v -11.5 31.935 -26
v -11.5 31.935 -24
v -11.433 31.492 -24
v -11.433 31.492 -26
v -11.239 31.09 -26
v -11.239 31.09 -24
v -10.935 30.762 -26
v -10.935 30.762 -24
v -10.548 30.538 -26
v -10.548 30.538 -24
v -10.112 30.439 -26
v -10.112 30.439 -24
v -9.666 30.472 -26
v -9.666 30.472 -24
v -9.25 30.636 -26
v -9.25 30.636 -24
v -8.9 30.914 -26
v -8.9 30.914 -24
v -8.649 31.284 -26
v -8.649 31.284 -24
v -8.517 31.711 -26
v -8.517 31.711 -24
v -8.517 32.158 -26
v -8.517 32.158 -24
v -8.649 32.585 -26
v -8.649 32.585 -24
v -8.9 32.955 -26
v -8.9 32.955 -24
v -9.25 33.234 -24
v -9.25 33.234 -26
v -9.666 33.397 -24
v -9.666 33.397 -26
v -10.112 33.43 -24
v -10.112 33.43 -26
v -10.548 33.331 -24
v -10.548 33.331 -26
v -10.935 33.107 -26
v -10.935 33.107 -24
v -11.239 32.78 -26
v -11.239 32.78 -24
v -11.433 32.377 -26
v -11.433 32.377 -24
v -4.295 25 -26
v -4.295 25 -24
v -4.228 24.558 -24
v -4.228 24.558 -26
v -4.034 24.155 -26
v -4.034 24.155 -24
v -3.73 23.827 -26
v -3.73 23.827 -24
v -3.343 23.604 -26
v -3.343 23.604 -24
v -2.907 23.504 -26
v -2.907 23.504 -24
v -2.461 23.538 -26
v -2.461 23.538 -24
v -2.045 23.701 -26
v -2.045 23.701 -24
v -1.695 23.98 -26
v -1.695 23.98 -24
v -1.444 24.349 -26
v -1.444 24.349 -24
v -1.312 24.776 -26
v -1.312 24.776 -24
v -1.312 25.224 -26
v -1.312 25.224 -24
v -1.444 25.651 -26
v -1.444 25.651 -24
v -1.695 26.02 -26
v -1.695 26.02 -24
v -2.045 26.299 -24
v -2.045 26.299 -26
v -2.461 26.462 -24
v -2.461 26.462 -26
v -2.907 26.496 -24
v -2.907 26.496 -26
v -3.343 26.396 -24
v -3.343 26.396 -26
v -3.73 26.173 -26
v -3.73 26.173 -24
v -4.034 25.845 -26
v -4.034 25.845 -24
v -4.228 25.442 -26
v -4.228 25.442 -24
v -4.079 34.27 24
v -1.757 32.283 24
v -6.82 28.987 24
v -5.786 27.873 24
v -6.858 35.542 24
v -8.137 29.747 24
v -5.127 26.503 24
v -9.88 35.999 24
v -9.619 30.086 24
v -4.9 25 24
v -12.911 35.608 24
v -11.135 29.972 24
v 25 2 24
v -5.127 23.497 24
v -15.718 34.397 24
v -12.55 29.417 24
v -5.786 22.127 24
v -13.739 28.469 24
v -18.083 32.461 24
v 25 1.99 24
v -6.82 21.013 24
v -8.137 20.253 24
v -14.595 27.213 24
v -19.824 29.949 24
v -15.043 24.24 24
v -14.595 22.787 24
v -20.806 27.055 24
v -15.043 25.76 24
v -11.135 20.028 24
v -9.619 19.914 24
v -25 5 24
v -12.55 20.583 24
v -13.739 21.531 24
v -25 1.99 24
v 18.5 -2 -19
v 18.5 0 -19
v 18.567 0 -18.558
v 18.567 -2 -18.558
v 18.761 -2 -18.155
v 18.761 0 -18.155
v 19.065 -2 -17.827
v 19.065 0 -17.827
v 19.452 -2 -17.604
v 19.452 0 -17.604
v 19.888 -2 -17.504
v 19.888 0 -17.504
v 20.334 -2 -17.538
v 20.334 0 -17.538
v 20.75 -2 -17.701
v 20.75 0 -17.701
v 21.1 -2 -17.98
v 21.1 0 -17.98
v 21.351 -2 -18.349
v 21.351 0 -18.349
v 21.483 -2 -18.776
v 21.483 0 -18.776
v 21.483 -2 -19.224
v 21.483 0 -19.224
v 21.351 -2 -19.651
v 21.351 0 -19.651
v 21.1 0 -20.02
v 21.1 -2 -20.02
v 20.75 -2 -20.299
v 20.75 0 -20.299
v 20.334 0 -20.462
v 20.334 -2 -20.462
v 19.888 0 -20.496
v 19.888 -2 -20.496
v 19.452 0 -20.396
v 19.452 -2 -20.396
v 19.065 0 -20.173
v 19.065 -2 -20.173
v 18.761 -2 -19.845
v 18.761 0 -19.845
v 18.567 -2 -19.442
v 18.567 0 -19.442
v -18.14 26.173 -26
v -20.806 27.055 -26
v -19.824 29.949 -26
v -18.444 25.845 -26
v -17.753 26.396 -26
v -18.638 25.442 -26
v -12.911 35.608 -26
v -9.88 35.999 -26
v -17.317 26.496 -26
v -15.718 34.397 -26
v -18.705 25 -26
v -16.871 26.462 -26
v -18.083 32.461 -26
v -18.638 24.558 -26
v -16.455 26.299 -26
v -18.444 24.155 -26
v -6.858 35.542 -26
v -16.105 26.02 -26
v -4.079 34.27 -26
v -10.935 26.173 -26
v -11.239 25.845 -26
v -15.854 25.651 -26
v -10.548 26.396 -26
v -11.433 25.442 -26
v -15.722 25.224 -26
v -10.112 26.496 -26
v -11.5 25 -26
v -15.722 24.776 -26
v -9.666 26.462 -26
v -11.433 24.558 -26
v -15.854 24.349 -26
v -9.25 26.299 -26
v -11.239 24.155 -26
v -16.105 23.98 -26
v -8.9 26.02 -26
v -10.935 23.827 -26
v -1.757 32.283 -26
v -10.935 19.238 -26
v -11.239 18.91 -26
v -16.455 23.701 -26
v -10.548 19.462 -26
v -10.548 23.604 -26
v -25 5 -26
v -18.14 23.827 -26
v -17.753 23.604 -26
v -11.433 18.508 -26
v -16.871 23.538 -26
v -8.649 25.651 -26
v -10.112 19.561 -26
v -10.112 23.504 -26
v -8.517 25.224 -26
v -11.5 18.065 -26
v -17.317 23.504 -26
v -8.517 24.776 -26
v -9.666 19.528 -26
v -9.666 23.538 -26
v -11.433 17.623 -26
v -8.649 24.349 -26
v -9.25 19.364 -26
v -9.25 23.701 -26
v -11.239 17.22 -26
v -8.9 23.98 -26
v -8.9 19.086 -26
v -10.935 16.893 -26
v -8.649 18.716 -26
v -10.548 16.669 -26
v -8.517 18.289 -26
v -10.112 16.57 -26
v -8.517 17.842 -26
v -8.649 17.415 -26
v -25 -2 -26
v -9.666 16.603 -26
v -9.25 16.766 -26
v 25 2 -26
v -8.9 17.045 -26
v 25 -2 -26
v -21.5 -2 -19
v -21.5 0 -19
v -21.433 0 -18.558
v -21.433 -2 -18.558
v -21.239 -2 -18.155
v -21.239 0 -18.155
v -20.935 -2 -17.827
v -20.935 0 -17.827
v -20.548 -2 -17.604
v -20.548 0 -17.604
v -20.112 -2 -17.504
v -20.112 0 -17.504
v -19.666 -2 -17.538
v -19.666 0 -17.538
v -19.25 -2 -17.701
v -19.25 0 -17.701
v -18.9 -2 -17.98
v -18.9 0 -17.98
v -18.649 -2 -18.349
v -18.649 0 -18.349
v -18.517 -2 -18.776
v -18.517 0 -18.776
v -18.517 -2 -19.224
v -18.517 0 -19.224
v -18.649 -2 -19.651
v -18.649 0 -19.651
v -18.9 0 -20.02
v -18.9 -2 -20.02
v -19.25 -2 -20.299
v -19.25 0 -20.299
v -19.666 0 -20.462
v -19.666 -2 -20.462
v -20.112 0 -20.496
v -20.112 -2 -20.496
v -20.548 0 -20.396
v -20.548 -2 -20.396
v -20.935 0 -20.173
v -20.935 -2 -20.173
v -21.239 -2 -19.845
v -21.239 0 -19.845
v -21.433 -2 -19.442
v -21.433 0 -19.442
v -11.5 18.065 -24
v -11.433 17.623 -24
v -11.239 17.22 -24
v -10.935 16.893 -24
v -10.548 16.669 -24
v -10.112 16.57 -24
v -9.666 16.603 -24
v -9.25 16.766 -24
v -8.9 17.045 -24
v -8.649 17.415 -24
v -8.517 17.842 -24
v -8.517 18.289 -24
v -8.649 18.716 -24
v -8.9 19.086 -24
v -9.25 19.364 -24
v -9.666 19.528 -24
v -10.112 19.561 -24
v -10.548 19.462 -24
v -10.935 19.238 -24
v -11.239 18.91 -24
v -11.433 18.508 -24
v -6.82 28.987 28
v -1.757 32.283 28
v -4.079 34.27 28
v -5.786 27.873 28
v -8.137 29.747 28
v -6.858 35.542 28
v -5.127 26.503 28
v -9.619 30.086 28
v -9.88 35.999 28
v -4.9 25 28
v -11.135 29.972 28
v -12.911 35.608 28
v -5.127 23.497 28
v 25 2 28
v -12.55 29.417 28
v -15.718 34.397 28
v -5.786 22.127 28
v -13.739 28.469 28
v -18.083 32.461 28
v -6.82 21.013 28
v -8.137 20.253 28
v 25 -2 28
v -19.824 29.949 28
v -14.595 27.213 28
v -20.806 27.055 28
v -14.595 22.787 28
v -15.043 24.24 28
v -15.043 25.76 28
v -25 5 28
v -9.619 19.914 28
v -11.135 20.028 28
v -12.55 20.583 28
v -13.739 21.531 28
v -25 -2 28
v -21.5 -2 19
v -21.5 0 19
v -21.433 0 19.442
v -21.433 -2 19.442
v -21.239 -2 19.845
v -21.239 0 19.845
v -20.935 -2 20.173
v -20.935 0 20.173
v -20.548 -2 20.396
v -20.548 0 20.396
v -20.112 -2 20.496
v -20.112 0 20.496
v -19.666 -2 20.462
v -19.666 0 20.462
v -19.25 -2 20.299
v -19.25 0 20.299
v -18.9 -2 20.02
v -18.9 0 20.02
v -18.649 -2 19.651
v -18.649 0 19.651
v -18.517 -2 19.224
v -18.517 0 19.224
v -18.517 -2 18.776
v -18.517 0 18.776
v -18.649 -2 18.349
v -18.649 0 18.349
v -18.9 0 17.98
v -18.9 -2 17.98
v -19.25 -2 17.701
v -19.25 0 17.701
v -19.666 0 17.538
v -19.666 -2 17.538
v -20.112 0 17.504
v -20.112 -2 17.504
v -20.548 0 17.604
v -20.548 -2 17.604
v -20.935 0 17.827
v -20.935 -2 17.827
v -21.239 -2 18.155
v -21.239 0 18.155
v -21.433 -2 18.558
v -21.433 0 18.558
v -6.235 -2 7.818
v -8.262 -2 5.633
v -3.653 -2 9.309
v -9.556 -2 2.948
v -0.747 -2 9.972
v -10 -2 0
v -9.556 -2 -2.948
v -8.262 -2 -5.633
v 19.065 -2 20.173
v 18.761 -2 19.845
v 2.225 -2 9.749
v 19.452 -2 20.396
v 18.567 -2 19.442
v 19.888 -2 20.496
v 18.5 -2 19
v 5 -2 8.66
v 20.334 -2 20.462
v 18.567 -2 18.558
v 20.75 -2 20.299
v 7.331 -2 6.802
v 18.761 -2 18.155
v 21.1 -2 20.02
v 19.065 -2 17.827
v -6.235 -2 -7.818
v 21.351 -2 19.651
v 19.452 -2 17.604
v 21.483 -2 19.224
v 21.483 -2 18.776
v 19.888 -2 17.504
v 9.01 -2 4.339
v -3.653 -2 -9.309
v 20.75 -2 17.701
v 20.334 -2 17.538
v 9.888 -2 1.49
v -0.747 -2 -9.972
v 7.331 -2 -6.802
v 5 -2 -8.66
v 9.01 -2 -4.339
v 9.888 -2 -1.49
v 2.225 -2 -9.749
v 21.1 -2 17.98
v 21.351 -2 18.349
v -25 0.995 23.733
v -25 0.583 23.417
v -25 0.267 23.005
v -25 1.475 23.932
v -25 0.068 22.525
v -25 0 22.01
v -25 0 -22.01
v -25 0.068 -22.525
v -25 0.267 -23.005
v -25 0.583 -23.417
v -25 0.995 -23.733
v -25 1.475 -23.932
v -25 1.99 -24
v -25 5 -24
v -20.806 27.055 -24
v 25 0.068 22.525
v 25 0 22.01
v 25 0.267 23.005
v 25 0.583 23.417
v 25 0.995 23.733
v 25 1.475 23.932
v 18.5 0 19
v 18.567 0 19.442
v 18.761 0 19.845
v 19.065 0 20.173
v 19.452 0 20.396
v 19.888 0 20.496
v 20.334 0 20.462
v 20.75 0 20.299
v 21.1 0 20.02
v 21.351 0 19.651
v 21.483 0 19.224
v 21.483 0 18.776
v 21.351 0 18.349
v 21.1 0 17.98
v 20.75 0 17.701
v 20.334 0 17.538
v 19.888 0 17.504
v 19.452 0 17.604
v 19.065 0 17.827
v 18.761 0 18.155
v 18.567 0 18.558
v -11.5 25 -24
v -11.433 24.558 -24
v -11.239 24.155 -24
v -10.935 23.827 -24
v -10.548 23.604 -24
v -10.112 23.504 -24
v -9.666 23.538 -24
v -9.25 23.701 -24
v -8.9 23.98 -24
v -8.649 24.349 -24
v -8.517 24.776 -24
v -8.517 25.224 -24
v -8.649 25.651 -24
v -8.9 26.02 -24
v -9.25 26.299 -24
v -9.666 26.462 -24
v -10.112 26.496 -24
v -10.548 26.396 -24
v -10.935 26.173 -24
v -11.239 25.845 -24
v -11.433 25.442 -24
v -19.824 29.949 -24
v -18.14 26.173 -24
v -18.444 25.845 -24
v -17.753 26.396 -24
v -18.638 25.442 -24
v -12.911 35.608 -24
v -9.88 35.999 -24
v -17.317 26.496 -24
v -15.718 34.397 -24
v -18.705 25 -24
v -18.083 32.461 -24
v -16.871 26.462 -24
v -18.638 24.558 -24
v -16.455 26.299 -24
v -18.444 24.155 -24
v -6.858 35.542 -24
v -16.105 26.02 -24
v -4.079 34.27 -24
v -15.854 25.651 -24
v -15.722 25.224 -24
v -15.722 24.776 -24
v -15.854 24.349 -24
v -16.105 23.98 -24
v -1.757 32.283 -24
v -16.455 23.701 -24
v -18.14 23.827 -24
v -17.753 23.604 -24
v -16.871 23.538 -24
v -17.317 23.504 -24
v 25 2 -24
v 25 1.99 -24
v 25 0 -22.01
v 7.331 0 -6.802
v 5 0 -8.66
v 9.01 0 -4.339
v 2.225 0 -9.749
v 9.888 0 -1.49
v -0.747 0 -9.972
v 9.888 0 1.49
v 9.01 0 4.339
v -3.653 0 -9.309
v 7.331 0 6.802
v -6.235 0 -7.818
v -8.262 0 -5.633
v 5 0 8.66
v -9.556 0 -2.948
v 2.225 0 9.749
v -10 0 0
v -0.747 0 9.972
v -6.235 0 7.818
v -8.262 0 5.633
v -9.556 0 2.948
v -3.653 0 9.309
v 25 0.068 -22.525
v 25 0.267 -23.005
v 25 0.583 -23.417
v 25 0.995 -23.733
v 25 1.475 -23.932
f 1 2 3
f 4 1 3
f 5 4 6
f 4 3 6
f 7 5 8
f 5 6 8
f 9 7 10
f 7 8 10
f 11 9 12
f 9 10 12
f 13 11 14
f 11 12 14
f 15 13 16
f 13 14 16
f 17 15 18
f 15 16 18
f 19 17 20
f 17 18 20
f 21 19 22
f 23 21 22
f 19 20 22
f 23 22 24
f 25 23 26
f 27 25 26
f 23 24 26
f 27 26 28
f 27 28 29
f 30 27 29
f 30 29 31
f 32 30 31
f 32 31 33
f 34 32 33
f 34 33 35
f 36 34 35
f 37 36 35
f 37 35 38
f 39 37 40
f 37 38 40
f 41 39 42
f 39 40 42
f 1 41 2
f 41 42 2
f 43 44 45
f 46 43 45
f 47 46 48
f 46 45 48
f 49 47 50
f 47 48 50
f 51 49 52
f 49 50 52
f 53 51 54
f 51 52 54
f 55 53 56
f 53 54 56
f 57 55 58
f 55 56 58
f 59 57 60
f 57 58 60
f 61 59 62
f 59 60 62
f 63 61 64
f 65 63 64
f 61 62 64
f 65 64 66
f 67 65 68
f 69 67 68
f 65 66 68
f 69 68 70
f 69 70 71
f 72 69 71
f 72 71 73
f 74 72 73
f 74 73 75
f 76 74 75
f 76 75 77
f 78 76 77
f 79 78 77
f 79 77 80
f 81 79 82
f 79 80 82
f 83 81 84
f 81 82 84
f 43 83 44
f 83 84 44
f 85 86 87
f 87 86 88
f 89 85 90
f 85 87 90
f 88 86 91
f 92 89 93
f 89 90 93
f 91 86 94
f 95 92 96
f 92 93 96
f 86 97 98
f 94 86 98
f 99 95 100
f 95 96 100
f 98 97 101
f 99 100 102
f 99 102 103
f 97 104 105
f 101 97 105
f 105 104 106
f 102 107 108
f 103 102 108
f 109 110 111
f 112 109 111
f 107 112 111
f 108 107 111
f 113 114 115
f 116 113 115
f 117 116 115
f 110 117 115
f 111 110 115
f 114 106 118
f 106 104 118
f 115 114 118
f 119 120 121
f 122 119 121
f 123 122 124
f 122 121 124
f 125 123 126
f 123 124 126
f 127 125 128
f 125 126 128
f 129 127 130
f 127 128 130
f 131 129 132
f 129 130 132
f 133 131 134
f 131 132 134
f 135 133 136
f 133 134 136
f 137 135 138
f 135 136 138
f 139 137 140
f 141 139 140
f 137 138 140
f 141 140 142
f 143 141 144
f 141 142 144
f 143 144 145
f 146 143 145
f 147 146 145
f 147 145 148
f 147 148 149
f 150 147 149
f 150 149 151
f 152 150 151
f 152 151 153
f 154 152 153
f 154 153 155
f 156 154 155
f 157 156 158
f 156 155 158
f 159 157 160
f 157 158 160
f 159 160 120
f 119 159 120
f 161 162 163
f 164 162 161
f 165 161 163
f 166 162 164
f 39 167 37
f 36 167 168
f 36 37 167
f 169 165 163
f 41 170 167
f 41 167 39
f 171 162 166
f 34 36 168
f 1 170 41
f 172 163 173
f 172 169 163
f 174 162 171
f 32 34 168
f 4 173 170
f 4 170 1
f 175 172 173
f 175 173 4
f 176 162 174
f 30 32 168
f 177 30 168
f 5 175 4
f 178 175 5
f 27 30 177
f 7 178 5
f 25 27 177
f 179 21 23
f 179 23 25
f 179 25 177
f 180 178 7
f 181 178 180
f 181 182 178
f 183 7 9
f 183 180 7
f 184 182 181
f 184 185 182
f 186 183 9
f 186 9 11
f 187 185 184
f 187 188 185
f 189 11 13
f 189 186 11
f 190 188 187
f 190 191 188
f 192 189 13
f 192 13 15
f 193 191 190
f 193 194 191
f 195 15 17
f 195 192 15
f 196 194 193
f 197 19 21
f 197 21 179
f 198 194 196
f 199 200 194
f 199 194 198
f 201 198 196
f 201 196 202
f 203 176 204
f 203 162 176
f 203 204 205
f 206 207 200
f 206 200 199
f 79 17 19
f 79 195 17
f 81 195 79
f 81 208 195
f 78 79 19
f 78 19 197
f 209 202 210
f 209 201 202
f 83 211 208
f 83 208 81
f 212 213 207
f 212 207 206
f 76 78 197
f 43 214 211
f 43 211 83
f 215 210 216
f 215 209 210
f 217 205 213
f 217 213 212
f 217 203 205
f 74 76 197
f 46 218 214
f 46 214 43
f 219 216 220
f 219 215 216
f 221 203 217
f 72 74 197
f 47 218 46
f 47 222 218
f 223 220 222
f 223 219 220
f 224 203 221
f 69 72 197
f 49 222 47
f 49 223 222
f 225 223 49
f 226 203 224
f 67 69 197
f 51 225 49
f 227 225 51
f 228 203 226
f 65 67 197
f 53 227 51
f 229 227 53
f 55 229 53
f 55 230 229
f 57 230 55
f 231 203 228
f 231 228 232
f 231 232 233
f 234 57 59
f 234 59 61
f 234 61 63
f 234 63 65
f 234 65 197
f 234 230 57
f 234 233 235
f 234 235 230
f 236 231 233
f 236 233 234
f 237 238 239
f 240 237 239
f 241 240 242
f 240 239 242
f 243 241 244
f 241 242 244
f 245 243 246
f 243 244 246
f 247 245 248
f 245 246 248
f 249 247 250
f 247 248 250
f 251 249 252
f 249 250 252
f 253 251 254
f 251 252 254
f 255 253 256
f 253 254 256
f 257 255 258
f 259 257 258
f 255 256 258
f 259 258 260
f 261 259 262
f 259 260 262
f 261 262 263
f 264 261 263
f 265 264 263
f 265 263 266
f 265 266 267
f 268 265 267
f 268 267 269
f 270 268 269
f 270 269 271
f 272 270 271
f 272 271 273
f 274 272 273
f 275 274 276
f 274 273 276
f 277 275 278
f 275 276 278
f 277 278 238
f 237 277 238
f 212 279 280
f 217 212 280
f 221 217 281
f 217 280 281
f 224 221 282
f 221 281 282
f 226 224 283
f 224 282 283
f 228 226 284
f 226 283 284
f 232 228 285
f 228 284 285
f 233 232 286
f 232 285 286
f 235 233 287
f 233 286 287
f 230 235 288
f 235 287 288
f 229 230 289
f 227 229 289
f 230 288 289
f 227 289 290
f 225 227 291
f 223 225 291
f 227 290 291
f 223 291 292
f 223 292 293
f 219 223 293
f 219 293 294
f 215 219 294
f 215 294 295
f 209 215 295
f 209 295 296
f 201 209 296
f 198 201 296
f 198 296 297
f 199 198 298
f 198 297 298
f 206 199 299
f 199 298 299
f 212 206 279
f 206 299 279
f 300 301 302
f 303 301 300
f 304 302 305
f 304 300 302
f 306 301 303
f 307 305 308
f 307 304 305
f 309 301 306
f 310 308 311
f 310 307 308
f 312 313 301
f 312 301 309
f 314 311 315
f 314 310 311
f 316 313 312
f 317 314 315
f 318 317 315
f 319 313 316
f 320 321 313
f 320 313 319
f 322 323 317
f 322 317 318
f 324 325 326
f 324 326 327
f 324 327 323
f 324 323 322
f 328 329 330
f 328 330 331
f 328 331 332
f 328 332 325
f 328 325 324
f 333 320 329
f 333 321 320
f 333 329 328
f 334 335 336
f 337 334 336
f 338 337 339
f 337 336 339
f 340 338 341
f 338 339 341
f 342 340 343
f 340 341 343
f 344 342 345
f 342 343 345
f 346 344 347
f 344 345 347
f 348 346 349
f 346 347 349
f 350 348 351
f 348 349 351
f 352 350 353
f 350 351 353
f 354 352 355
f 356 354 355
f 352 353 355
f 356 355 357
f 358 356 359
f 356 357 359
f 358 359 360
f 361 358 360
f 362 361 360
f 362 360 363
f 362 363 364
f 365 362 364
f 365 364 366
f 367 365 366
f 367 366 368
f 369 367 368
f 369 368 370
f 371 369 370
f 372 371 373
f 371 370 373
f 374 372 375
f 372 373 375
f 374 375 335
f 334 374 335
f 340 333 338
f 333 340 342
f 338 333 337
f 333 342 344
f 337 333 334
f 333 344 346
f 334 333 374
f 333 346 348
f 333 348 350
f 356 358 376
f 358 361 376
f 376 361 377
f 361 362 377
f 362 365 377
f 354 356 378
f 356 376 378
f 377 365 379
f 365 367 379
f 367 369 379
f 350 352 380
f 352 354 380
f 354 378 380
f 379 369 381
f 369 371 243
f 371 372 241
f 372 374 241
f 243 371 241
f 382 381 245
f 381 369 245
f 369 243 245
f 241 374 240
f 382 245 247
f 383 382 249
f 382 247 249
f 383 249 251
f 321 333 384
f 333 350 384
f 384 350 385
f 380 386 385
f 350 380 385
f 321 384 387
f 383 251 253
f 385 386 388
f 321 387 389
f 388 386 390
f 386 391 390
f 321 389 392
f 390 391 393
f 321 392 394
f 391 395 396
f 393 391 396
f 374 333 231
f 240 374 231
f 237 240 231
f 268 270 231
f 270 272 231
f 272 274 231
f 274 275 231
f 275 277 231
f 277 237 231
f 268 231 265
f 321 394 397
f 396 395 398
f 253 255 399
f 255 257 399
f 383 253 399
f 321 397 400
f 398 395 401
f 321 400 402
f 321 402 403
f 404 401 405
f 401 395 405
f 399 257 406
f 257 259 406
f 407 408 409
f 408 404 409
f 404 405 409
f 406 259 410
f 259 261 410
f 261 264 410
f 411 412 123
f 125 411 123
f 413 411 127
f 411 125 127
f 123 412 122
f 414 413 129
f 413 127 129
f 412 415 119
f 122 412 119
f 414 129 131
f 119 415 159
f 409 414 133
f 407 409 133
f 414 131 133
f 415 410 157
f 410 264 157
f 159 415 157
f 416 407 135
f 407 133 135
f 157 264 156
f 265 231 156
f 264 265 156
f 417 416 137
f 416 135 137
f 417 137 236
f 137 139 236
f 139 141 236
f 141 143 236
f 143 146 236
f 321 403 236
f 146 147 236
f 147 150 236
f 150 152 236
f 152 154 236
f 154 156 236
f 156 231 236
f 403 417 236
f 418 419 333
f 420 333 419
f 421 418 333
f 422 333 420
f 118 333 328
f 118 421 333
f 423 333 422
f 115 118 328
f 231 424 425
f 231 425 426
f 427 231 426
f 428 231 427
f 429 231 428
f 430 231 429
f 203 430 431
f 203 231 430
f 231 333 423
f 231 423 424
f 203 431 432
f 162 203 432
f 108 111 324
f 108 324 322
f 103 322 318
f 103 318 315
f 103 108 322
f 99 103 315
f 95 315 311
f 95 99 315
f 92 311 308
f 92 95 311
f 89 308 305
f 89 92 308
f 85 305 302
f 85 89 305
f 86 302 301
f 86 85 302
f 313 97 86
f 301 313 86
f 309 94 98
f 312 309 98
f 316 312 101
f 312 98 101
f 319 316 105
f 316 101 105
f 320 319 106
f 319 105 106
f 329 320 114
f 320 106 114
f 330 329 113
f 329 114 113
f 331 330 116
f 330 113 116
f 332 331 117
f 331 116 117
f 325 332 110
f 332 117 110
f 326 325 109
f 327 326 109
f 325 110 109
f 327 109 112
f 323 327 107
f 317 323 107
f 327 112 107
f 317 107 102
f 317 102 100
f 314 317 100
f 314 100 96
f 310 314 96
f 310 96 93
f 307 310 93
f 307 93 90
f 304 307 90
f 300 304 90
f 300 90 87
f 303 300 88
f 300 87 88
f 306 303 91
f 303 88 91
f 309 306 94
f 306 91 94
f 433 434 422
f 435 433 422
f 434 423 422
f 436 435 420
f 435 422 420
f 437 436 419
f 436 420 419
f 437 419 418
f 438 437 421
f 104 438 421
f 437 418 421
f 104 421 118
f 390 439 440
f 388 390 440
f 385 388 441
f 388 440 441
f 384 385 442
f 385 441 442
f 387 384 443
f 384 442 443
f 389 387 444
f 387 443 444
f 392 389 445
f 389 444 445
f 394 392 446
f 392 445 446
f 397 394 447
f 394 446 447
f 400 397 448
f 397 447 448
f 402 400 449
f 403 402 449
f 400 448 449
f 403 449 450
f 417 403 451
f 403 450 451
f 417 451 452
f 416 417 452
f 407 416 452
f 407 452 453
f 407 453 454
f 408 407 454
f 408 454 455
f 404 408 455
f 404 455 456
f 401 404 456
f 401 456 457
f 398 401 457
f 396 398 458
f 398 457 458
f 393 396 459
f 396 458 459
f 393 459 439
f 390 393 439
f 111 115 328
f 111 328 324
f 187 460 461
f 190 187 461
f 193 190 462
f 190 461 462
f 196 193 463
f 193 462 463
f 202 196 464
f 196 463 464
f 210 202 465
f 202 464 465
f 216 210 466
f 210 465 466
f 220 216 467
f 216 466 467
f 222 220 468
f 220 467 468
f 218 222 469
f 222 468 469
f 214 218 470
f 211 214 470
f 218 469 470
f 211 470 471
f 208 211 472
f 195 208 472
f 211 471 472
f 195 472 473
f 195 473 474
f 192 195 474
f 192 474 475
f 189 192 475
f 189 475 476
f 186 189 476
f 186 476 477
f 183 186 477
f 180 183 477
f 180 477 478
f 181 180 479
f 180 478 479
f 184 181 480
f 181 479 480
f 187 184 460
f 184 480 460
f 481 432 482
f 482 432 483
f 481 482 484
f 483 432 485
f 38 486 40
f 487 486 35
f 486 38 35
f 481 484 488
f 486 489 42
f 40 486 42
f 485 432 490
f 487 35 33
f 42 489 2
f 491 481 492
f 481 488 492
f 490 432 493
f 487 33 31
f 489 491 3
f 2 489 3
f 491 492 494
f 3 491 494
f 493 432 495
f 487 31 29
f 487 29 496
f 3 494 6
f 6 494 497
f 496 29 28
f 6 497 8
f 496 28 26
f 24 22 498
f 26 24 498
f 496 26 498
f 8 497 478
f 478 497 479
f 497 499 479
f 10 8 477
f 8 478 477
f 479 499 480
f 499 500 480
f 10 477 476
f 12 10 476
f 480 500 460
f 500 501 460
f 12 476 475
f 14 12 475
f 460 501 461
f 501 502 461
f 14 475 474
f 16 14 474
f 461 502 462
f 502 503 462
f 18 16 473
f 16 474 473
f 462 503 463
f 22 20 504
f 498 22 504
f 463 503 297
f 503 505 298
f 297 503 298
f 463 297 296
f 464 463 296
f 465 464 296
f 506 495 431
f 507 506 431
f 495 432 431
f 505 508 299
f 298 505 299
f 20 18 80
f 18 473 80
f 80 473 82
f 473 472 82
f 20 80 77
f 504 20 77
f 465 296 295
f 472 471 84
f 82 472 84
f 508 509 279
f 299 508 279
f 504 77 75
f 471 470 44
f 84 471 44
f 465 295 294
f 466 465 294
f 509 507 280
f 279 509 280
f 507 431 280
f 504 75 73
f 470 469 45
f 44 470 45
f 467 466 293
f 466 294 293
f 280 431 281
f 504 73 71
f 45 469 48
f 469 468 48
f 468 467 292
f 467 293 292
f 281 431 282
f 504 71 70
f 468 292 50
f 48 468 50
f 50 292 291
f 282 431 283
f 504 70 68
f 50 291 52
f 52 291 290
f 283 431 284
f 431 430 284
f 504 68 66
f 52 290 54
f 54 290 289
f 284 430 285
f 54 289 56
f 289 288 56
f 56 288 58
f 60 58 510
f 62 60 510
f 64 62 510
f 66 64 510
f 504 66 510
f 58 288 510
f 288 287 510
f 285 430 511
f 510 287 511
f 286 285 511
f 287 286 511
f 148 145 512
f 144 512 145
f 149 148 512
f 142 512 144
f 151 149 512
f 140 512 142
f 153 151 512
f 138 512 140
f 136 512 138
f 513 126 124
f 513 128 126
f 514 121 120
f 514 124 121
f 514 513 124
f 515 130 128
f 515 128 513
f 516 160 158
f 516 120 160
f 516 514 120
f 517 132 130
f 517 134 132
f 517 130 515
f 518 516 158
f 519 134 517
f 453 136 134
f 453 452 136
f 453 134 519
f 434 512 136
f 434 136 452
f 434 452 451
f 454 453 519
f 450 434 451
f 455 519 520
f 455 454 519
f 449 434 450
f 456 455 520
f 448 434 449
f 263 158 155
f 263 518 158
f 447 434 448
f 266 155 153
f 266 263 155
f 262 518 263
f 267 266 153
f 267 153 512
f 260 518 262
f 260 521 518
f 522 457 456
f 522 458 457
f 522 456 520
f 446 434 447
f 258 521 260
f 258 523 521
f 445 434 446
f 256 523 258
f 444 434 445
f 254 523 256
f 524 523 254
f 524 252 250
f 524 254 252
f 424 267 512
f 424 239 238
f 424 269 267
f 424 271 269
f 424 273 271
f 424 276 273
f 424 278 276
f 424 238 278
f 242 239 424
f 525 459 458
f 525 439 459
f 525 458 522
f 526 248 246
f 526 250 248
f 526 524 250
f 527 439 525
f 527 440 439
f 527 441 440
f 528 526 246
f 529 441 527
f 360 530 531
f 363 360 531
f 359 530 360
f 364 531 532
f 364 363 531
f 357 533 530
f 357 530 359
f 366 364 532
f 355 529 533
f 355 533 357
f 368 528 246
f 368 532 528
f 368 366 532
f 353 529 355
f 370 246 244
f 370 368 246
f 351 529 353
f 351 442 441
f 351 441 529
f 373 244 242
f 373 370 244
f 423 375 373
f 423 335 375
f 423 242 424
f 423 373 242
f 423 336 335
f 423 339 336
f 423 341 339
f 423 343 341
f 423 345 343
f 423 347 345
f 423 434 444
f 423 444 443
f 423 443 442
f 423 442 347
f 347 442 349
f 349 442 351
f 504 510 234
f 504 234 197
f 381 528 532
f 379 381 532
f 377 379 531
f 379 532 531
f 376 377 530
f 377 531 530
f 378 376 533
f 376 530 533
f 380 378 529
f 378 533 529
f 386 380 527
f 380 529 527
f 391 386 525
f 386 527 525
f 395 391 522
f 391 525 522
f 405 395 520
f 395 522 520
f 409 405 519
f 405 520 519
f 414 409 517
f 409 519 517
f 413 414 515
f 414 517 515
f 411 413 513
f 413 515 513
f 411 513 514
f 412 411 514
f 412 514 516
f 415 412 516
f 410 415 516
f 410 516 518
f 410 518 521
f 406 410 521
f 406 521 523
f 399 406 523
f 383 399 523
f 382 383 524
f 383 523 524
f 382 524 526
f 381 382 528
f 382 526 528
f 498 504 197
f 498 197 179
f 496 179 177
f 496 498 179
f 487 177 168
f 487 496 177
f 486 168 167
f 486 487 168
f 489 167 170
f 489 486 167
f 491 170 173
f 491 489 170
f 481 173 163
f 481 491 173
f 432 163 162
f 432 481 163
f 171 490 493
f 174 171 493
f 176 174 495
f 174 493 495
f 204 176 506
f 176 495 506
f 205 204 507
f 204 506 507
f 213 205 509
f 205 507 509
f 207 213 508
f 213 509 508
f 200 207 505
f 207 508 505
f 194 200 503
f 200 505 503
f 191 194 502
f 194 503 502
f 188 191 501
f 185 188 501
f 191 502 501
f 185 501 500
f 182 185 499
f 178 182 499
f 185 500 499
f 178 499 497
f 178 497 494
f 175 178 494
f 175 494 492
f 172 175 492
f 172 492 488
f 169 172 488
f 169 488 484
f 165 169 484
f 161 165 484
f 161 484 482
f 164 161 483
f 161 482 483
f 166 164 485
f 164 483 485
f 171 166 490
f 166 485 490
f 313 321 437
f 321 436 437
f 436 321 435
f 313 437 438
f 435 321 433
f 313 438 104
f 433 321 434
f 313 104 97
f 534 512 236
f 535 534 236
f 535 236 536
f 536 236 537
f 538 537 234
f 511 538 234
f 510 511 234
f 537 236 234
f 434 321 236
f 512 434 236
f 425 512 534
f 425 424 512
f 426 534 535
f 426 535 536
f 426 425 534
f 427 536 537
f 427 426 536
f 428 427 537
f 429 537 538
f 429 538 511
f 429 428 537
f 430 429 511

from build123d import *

# Parameters (mm, degrees)
SKETCH_W     = 50
SKETCH_H     = 48
SKETCH_R     = 1.5
SKETCH_R_2   = 10
PAD_DEPTH    = 2
SKETCH003_R  = 1.5
PAD001_DEPTH = 2
SKETCH004_R  = 5.1
PAD002_DEPTH = 4
FILLET_R     = 1.99
FILLET001_R  = 1.99


with BuildPart() as body:
    # Sketch → Pad (new body)
    with BuildSketch(Plane.XZ):
        Rectangle(SKETCH_W, SKETCH_H)
        with Locations((-20, 19)):
            Circle(SKETCH_R, mode=Mode.SUBTRACT)
        with Locations((20, 19)):
            Circle(SKETCH_R, mode=Mode.SUBTRACT)
        with Locations((-20, -19)):
            Circle(SKETCH_R, mode=Mode.SUBTRACT)
        with Locations((20, -19)):
            Circle(SKETCH_R, mode=Mode.SUBTRACT)
        Circle(SKETCH_R_2, mode=Mode.SUBTRACT)
    extrude(amount=PAD_DEPTH)

    # Sketch003 (on Face3 of Pad) → Pad001 (join)
    with BuildSketch(Plane(origin=(0, 0, -24), x_dir=(1, 0, 0), z_dir=(0, 0, -1))):
        with BuildLine():
            Line((-25, 0), (-25, 2))
            Line((-25, 2), (25, 2))
            Line((25, 2), (25, 0))
            Line((25, 0), (25, -5))
            Line((25, -5), (20.80638, -27.054785))
            ThreePointArc((1.756653, -32.283353), (12.911489, -35.607697), (20.80638, -27.054785))
            Line((-25, -2), (1.756653, -32.283353))
            Line((-25, 0), (-25, -2))
        make_face()
        with Locations((10, -31.934549)):
            Circle(SKETCH003_R, mode=Mode.SUBTRACT)
        with Locations((17.205, -25)):
            Circle(SKETCH003_R, mode=Mode.SUBTRACT)
        with Locations((10, -25)):
            Circle(SKETCH003_R, mode=Mode.SUBTRACT)
        with Locations((2.795, -25)):
            Circle(SKETCH003_R, mode=Mode.SUBTRACT)
        with Locations((10, -18.065451)):
            Circle(SKETCH003_R, mode=Mode.SUBTRACT)
    extrude(amount=PAD001_DEPTH)

    # Sketch004 (on Face1 of Pad) → Pad002 (join)
    with BuildSketch(Plane(origin=(0, 0, 24), x_dir=(-1, 0, 0), z_dir=(0, 0, 1))):
        with BuildLine():
            Line((-25, 2), (25, 2))
            Line((25, 2), (25, 0))
            Line((25, 0), (25, -2))
            Line((25, -2), (-1.756653, -32.283353))
            ThreePointArc((-20.80638, -27.054785), (-12.911489, -35.607697), (-1.756653, -32.283353))
            Line((-25, -5), (-20.80638, -27.054785))
            Line((-25, 0), (-25, -5))
            Line((-25, 0), (-25, 2))
        make_face()
        with Locations((-10, -25)):
            Circle(SKETCH004_R, mode=Mode.SUBTRACT)
    extrude(amount=PAD002_DEPTH)

    # Fillet
    fillet_edges = [body.edges().sort_by_distance(p)[0] for p in [
        (0, 0, 24),
    ]]
    fillet(fillet_edges, radius=FILLET_R)

    # Fillet001
    fillet001_edges = [body.edges().sort_by_distance(p)[0] for p in [
        (0, 0, -24),
    ]]
    fillet(fillet001_edges, radius=FILLET001_R)


with BuildPart() as part_mirroring:
    # Part__Mirroring: instance of Body
    add(body.part.mirror(Plane(origin=(0, 0, 0), x_dir=(0, -1, 0), z_dir=(1, 0, 0))))


solid = part_mirroring.part
